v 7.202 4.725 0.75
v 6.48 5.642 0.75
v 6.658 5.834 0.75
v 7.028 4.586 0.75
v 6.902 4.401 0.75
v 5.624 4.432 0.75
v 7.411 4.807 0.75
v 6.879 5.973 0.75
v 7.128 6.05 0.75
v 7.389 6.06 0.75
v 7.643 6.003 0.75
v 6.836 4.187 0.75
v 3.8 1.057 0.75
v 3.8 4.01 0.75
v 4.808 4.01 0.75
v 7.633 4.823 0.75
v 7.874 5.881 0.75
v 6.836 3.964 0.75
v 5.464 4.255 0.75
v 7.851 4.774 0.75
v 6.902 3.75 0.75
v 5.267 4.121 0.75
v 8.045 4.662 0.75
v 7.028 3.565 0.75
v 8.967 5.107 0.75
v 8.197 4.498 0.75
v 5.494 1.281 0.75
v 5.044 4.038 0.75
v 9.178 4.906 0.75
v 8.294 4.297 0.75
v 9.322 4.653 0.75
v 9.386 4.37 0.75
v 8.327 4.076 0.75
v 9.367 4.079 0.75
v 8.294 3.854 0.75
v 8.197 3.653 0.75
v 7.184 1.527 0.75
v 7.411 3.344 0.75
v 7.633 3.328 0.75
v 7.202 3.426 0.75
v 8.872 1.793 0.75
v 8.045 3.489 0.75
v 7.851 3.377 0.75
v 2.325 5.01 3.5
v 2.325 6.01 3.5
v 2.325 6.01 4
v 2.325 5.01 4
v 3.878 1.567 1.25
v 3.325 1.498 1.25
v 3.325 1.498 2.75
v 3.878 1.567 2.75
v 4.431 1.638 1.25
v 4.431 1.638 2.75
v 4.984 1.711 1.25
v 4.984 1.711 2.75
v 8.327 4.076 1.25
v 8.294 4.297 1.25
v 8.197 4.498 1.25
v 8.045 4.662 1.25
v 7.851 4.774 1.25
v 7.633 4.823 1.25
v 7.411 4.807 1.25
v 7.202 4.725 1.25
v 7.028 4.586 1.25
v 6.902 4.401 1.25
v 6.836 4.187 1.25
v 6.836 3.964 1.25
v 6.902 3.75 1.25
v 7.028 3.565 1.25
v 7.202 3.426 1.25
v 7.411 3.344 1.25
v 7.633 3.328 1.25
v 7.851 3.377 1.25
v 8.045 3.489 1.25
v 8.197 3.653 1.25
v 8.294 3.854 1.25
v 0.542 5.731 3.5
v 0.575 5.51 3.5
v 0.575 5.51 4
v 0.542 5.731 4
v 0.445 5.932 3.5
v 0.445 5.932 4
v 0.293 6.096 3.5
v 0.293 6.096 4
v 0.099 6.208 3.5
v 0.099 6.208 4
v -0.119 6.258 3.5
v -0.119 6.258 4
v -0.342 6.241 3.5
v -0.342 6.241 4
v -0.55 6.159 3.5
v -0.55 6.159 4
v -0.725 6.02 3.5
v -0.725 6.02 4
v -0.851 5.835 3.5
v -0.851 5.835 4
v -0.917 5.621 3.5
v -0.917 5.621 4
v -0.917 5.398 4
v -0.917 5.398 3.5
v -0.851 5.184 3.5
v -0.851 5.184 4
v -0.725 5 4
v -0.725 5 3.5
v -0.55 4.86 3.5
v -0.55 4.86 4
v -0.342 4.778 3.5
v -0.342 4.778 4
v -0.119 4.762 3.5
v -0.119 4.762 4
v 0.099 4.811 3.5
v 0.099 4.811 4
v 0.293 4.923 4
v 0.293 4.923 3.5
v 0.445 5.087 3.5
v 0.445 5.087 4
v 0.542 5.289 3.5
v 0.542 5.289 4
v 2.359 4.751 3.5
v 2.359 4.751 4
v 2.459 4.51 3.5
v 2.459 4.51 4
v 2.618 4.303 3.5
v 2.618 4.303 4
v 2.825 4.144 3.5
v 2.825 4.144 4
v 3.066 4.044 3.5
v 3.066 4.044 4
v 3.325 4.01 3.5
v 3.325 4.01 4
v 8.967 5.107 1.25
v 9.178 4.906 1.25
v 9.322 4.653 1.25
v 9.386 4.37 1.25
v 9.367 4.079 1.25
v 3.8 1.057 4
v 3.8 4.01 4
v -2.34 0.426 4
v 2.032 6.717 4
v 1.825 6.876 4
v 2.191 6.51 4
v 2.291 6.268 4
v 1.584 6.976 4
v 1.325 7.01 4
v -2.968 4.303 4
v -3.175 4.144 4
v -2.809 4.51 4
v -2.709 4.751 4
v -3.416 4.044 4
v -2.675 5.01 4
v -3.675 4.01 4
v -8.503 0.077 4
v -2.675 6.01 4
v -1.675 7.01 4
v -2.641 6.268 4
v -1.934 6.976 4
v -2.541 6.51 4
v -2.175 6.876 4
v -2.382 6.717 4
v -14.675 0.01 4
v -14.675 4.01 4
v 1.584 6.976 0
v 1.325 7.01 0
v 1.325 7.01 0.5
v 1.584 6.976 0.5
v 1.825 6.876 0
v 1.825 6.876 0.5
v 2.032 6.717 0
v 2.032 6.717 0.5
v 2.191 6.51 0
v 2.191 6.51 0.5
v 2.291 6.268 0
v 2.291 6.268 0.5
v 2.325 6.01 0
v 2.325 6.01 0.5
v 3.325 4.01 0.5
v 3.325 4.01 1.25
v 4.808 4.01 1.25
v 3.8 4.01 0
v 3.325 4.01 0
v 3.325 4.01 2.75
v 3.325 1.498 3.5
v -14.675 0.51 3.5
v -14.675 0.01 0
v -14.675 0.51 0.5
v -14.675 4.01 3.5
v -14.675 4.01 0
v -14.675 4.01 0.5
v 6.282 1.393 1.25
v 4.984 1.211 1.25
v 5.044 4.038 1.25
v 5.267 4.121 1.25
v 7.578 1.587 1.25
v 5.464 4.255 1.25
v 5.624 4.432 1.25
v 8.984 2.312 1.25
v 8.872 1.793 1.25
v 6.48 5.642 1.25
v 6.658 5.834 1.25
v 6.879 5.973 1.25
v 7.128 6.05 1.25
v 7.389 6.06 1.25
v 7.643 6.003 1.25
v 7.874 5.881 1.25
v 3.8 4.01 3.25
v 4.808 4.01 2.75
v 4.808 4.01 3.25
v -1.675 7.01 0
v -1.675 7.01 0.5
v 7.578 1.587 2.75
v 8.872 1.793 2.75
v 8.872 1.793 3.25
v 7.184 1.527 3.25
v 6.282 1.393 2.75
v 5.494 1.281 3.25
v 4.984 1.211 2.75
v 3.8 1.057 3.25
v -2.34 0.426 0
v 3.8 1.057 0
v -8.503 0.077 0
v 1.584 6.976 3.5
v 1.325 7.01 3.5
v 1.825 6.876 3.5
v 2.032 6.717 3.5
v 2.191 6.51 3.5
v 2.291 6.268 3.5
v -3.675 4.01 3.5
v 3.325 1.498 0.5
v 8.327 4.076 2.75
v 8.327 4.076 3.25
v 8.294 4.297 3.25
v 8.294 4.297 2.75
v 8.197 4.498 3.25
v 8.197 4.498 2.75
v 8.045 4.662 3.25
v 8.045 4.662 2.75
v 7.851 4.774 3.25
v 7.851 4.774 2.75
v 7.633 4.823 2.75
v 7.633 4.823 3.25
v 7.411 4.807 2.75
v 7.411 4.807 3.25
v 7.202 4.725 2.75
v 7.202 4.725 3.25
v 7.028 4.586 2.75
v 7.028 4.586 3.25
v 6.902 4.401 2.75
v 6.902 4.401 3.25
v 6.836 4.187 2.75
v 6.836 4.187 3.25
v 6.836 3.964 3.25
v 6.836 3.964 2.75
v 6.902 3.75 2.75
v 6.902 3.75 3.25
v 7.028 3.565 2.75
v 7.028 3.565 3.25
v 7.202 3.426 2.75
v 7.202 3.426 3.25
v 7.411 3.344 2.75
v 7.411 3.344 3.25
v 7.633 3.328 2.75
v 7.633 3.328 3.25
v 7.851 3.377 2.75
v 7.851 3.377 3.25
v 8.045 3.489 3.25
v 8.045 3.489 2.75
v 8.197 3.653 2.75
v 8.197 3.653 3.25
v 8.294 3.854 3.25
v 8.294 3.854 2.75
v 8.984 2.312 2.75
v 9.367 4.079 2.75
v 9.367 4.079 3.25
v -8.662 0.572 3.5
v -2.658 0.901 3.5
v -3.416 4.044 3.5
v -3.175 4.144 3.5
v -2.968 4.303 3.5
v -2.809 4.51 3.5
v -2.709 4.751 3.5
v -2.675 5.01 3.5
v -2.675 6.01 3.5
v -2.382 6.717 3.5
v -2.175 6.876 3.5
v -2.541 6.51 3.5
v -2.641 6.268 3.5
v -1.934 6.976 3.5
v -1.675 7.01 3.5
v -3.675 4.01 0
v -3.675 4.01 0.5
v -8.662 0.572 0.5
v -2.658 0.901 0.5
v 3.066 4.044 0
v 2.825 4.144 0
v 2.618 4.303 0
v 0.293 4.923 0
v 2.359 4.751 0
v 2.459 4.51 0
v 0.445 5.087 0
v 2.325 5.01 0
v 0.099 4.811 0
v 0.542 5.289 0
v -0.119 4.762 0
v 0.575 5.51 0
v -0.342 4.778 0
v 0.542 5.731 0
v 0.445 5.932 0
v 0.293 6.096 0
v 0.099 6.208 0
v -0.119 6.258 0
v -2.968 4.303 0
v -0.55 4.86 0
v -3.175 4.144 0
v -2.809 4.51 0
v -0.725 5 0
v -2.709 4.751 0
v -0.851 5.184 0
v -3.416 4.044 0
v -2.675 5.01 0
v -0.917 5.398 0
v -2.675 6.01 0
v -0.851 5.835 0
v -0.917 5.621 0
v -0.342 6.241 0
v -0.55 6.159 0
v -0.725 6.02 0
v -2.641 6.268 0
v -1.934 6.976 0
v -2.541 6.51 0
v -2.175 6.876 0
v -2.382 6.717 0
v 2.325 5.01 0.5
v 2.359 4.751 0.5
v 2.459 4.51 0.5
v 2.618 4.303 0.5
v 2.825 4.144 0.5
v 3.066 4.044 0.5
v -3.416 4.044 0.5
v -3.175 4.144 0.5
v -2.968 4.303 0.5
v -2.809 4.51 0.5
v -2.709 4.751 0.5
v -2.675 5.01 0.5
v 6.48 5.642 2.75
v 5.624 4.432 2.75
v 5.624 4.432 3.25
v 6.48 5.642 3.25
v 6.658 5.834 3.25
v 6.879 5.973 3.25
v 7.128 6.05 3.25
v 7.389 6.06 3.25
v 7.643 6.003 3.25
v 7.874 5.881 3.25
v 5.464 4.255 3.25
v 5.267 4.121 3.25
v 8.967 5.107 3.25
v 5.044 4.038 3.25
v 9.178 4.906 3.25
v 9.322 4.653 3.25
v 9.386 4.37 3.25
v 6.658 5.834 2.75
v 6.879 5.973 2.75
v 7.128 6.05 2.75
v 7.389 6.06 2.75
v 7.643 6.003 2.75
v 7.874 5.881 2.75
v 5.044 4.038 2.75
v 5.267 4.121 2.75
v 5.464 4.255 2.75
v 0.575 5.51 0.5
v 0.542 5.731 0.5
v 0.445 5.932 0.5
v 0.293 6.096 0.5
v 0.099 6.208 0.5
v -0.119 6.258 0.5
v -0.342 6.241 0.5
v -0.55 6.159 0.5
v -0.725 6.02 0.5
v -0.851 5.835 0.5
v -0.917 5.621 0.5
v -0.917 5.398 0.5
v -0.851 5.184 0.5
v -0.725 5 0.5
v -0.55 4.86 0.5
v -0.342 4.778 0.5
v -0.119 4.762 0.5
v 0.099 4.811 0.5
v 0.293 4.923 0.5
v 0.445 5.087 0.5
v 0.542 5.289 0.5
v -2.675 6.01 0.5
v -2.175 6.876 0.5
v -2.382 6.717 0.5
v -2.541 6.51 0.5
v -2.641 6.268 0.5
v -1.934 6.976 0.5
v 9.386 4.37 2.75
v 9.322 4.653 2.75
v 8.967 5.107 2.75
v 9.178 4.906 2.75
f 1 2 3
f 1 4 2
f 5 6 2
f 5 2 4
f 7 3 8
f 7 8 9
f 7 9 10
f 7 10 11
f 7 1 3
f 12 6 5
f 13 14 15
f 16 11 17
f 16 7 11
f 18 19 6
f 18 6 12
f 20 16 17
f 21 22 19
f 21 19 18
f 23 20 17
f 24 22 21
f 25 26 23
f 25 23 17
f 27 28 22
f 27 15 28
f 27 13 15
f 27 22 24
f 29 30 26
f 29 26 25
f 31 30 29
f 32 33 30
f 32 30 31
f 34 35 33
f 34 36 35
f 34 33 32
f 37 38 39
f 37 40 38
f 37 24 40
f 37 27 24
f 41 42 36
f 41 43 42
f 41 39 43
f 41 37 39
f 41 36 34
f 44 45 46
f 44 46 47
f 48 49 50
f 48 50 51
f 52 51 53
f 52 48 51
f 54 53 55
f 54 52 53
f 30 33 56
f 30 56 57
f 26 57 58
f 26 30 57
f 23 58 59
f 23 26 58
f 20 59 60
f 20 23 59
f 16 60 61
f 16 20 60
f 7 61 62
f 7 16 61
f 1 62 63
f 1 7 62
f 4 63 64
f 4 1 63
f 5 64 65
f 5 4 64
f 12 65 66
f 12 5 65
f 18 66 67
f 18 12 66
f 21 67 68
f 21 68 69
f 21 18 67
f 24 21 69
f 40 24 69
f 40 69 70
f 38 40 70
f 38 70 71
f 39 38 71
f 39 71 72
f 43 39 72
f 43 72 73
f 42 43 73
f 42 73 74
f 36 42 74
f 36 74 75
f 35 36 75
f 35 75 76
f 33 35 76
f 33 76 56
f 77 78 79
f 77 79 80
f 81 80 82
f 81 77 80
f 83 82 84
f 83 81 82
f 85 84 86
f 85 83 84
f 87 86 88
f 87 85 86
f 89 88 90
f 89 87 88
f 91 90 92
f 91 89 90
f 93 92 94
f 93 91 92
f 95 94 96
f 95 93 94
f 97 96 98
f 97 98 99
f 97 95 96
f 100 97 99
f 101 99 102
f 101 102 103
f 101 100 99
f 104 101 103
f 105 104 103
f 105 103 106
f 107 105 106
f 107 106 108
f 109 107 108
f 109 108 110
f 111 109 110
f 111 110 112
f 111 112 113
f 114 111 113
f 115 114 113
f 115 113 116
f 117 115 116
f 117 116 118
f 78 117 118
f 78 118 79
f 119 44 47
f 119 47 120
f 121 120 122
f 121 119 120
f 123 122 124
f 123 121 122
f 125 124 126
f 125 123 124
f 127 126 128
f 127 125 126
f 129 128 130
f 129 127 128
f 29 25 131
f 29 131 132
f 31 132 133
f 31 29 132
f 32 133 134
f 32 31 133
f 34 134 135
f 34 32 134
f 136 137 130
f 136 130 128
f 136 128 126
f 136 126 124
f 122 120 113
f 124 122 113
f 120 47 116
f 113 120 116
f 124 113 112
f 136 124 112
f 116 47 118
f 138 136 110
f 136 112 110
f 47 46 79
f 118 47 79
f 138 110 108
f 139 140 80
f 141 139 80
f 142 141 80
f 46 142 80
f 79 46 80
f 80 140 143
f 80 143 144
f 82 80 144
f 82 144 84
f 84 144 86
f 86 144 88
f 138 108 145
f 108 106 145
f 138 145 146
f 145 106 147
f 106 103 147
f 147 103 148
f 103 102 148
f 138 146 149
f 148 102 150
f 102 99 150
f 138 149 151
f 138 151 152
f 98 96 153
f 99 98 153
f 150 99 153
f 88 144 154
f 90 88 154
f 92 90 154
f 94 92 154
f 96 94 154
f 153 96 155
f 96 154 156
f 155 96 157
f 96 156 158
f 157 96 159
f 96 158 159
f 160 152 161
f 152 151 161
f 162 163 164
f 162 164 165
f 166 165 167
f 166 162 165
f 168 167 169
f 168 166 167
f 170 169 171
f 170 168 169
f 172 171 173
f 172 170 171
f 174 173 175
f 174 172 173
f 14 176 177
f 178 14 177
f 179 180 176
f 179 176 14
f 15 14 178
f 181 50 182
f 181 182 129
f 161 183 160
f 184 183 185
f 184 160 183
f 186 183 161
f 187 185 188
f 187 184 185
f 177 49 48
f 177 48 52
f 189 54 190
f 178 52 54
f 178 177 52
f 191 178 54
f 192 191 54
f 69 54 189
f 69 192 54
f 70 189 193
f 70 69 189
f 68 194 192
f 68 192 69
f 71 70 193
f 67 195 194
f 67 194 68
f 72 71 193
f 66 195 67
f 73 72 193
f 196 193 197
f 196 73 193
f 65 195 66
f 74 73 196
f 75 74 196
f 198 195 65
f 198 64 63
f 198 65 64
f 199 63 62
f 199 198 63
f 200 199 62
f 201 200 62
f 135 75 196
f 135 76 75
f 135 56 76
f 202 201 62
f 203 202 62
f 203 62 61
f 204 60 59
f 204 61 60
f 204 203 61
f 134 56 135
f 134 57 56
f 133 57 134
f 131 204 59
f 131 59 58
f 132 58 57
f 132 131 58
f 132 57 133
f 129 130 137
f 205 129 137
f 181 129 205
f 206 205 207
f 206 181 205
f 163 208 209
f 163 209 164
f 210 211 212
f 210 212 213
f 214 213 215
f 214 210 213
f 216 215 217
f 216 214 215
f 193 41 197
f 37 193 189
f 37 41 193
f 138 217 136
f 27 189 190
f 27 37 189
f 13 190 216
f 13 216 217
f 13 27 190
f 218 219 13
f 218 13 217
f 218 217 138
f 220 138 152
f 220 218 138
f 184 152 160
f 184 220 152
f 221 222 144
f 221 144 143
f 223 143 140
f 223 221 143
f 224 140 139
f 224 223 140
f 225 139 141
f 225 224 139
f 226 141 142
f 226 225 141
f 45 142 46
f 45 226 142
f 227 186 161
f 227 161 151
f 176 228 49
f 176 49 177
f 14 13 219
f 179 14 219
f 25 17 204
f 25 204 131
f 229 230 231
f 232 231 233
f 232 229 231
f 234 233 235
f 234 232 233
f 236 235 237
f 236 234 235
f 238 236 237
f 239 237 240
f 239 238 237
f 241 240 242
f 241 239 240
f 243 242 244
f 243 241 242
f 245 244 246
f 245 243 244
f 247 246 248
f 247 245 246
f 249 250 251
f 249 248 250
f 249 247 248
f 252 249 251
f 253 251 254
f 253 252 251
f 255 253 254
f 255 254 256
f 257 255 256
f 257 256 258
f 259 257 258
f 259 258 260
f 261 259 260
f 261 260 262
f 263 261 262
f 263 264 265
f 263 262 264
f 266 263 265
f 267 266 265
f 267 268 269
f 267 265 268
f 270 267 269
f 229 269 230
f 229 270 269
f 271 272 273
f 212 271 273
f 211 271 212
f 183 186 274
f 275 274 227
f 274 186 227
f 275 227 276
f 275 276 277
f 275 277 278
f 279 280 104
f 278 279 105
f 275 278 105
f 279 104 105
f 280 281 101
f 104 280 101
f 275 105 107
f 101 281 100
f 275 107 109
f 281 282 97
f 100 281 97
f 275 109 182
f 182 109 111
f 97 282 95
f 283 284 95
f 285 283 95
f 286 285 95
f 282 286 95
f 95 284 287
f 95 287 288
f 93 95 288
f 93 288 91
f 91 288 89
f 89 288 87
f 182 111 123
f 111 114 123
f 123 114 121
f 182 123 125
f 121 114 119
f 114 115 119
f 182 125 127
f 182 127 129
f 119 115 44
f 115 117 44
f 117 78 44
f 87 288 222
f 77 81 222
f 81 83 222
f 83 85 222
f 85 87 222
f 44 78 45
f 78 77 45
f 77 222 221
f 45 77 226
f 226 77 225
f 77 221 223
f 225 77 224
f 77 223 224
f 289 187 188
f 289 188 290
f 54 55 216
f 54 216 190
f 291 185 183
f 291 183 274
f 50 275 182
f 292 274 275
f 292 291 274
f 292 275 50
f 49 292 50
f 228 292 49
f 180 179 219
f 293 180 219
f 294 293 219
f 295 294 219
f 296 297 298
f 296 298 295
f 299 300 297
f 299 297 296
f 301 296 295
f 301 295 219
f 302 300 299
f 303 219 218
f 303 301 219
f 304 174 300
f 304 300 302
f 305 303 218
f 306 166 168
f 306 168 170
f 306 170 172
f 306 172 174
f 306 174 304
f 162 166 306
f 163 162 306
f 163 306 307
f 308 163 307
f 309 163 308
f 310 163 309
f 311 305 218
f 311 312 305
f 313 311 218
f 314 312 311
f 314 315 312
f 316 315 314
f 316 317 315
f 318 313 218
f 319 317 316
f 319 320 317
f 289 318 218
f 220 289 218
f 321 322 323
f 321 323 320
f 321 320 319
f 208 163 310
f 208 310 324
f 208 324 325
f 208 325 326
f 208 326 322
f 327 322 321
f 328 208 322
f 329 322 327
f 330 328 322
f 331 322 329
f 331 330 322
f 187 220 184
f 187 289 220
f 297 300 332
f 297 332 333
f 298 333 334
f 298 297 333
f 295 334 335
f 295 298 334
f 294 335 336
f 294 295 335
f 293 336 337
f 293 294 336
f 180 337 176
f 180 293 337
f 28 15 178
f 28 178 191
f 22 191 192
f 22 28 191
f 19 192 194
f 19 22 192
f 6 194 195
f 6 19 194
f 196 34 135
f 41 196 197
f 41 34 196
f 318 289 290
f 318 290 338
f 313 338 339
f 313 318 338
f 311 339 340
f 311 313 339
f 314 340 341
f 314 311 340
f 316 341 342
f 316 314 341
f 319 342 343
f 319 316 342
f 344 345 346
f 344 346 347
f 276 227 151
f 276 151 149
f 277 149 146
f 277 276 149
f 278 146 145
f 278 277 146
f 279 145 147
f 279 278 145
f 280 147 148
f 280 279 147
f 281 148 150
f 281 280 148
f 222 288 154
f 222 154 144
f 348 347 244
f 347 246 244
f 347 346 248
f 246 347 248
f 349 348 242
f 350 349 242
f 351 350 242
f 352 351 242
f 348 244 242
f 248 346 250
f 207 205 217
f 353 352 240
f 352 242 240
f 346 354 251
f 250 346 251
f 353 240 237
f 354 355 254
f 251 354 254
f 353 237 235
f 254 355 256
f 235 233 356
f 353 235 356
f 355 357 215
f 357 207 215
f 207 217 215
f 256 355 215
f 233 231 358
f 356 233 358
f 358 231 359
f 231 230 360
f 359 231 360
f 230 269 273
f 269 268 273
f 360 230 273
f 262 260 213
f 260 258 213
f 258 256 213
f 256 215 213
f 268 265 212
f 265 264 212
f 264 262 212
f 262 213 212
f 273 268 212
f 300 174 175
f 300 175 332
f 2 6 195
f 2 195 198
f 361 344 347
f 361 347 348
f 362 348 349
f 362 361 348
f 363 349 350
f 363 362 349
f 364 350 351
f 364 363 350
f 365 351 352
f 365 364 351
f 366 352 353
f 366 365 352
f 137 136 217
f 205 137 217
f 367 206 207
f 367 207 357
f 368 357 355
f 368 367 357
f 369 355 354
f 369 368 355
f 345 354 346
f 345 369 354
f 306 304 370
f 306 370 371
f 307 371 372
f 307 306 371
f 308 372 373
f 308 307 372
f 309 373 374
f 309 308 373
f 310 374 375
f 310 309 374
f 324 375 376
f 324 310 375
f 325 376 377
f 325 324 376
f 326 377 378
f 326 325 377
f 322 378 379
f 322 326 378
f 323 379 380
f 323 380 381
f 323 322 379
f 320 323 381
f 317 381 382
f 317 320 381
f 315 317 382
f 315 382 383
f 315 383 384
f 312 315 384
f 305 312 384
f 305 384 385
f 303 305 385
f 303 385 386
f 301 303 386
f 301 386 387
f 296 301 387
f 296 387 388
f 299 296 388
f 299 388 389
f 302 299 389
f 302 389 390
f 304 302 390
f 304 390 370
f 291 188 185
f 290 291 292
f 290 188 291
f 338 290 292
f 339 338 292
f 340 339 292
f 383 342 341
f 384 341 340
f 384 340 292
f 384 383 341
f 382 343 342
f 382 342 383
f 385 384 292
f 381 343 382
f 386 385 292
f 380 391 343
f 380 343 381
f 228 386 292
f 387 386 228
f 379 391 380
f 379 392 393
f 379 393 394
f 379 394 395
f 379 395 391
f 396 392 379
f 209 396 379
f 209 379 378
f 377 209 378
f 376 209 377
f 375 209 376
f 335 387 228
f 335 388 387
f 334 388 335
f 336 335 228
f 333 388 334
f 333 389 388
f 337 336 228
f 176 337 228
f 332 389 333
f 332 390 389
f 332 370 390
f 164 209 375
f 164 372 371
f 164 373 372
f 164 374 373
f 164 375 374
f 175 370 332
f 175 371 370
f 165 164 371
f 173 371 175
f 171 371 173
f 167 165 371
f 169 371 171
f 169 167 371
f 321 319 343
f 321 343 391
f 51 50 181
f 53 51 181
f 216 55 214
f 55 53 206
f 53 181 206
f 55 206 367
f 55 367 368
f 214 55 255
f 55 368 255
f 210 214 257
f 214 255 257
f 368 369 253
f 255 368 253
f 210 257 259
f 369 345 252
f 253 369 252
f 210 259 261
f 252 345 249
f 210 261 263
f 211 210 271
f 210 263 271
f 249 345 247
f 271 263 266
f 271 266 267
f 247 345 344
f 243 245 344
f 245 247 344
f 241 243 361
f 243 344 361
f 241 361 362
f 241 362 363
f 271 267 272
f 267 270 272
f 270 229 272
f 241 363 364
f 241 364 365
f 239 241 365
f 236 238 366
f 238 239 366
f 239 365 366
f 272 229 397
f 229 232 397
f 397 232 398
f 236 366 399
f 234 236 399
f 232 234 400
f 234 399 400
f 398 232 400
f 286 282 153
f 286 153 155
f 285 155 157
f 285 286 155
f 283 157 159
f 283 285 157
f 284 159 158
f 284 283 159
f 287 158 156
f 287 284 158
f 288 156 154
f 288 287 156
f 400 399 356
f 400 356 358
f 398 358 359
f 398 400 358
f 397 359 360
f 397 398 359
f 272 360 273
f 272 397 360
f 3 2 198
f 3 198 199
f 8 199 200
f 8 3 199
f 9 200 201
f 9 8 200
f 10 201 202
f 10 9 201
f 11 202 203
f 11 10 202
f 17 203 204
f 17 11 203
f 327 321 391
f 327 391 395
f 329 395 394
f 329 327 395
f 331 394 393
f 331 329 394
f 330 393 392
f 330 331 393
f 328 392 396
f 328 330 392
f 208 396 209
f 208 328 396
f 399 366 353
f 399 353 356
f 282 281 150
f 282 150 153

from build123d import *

# Parameters (mm, degrees)
SCHIZZO2_R                     = 0.75
ESTRUSIONE_ESTRUSIONE1_DEPTH   = 4
TAGLIO_ESTRUSIONE1_START       = 0.5
TAGLIO_ESTRUSIONE1_OUTLINE_R   = 0.75
TAGLIO_ESTRUSIONE1_DEPTH       = 3
TAGLIO_ESTRUSIONE1_START_2     = 1.25
TAGLIO_ESTRUSIONE1_2_OUTLINE_R = 0.75
TAGLIO_ESTRUSIONE1_2_DEPTH     = 1.5
SCHIZZO5_W                     = 7
SCHIZZO5_H                     = 3
TAGLIO_ESTRUSIONE4_DEPTH       = 10
SCHIZZO6_W                     = 4
SCHIZZO6_H                     = 1.5
TAGLIO_ESTRUSIONE5_DEPTH       = 17.747826397


# Read off the part's stored shape, not the designer's step: Taglio-Estrusione1
with BuildPart() as part:
    # Schizzo2 → Estrusione-Estrusione1 (new body)
    with BuildSketch(Plane.XY):
        with BuildLine():
            Line((-1.674960789, 7.009651551), (1.325039211, 7.009651551))
            ThreePointArc((1.325039211, 7.009651551), (2.032145992, 6.716758332), (2.325039211, 6.009651551))
            Line((2.325039211, 6.009651551), (2.325039211, 5.009651551))
            ThreePointArc((2.325039211, 5.009651551), (2.61793243, 4.30254477), (3.325039211, 4.009651551))
            Line((3.325039211, 4.009651551), (4.807645267, 4.009651551))
            ThreePointArc((4.807645267, 4.009651551), (5.267175084, 4.121489209), (5.623919425, 4.431986858))
            Line((5.623919425, 4.431986858), (6.480368598, 5.642199868))
            ThreePointArc((6.480368598, 5.642199868), (7.127920386, 6.050198789), (7.87430745, 5.880809333))
            Line((7.87430745, 5.880809333), (8.967214405, 5.107375855))
            ThreePointArc((8.967214405, 5.107375855), (9.321590916, 4.653454003), (9.366876691, 4.079366068))
            Line((9.366876691, 4.079366068), (8.871648882, 1.793499009))
            ThreePointArc((8.871648882, 1.793499009), (-2.862577448, 0.385742883), (-14.674960789, 0.009651551))
            Line((-14.674960789, 0.009651551), (-14.674960789, 4.009651551))
            Line((-14.674960789, 4.009651551), (-3.674960789, 4.009651551))
            ThreePointArc((-3.674960789, 4.009651551), (-2.967854008, 4.30254477), (-2.674960789, 5.009651551))
            Line((-2.674960789, 5.009651551), (-2.674960789, 6.009651551))
            ThreePointArc((-2.674960789, 6.009651551), (-2.38206757, 6.716758332), (-1.674960789, 7.009651551))
        make_face()
        with Locations((-0.174960789, 5.509651551)):
            Circle(SCHIZZO2_R, mode=Mode.SUBTRACT)
        with Locations((7.577394386, 4.07554752)):
            Circle(SCHIZZO2_R, mode=Mode.SUBTRACT)
    extrude(amount=ESTRUSIONE_ESTRUSIONE1_DEPTH)

    # Taglio-Estrusione1 outline → Taglio-Estrusione1 (cut)
    with BuildSketch(Plane.XY.offset(TAGLIO_ESTRUSIONE1_START)):
        with BuildLine():
            ThreePointArc((-14.674960789, 0.509651551), (-5.658443288, 0.703091506), (3.325039211, 1.498106631))
            Line((3.325039211, 1.498106631), (3.325039211, 4.009651551))
            ThreePointArc((3.325039211, 4.009651551), (2.61793243, 4.30254477), (2.325039211, 5.009651551))
            Line((2.325039211, 5.009651551), (2.325039211, 6.009651551))
            ThreePointArc((2.325039211, 6.009651551), (2.032145992, 6.716758332), (1.325039211, 7.009651551))
            Line((1.325039211, 7.009651551), (-1.674960789, 7.009651551))
            ThreePointArc((-1.674960789, 7.009651551), (-2.38206757, 6.716758332), (-2.674960789, 6.009651551))
            Line((-2.674960789, 6.009651551), (-2.674960789, 5.009651551))
            ThreePointArc((-2.674960789, 5.009651551), (-2.967854008, 4.30254477), (-3.674960789, 4.009651551))
            Line((-3.674960789, 4.009651551), (-14.674960789, 4.009651551))
            Line((-14.674960789, 4.009651551), (-14.674960789, 0.509651551))
        make_face()
        with Locations((-0.174960789, 5.509651551)):
            Circle(TAGLIO_ESTRUSIONE1_OUTLINE_R, mode=Mode.SUBTRACT)
    extrude(amount=TAGLIO_ESTRUSIONE1_DEPTH, mode=Mode.SUBTRACT)

    # Taglio-Estrusione1 2 outline → Taglio-Estrusione1 2 (cut)
    with BuildSketch(Plane.XY.offset(TAGLIO_ESTRUSIONE1_START_2)):
        with BuildLine():
            ThreePointArc((3.325039211, 1.498106631), (6.158824123, 1.87511554), (8.983990596, 2.312044653))
            Line((8.983990596, 2.312044653), (9.366876691, 4.079366068))
            ThreePointArc((9.366876691, 4.079366068), (9.321590916, 4.653454003), (8.967214405, 5.107375855))
            Line((8.967214405, 5.107375855), (7.87430745, 5.880809333))
            ThreePointArc((7.87430745, 5.880809333), (7.127920386, 6.050198789), (6.480368598, 5.642199868))
            Line((6.480368598, 5.642199868), (5.623919425, 4.431986858))
            ThreePointArc((5.623919425, 4.431986858), (5.267175084, 4.121489209), (4.807645267, 4.009651551))
            Line((4.807645267, 4.009651551), (3.325039211, 4.009651551))
            Line((3.325039211, 4.009651551), (3.325039211, 1.498106631))
        make_face()
        with Locations((7.577394386, 4.07554752)):
            Circle(TAGLIO_ESTRUSIONE1_2_OUTLINE_R, mode=Mode.SUBTRACT)
    extrude(amount=TAGLIO_ESTRUSIONE1_2_DEPTH, mode=Mode.SUBTRACT)

    # Schizzo5 → Taglio-Estrusione4 (cut)
    with BuildSketch(Plane(origin=(0, 0, 0), x_dir=(1, 0, 0), z_dir=(0, 1, 0))):
        with Locations((7.3, 0.75)):
            Rectangle(SCHIZZO5_W, SCHIZZO5_H)
        with Locations((7.3, -4.75)):
            Rectangle(SCHIZZO5_W, SCHIZZO5_H)
    extrude(amount=TAGLIO_ESTRUSIONE4_DEPTH, mode=Mode.SUBTRACT)

    # Schizzo6 → Taglio-Estrusione5 (cut, through all)
    with BuildSketch(Plane(origin=(0, 7.009651551, 0), x_dir=(1, 0, 0), z_dir=(0, 1, 0))):
        with Locations((6.983990596, -2)):
            Rectangle(SCHIZZO6_W, SCHIZZO6_H)
    extrude(amount=-TAGLIO_ESTRUSIONE5_DEPTH, mode=Mode.SUBTRACT)


solid = part.part
